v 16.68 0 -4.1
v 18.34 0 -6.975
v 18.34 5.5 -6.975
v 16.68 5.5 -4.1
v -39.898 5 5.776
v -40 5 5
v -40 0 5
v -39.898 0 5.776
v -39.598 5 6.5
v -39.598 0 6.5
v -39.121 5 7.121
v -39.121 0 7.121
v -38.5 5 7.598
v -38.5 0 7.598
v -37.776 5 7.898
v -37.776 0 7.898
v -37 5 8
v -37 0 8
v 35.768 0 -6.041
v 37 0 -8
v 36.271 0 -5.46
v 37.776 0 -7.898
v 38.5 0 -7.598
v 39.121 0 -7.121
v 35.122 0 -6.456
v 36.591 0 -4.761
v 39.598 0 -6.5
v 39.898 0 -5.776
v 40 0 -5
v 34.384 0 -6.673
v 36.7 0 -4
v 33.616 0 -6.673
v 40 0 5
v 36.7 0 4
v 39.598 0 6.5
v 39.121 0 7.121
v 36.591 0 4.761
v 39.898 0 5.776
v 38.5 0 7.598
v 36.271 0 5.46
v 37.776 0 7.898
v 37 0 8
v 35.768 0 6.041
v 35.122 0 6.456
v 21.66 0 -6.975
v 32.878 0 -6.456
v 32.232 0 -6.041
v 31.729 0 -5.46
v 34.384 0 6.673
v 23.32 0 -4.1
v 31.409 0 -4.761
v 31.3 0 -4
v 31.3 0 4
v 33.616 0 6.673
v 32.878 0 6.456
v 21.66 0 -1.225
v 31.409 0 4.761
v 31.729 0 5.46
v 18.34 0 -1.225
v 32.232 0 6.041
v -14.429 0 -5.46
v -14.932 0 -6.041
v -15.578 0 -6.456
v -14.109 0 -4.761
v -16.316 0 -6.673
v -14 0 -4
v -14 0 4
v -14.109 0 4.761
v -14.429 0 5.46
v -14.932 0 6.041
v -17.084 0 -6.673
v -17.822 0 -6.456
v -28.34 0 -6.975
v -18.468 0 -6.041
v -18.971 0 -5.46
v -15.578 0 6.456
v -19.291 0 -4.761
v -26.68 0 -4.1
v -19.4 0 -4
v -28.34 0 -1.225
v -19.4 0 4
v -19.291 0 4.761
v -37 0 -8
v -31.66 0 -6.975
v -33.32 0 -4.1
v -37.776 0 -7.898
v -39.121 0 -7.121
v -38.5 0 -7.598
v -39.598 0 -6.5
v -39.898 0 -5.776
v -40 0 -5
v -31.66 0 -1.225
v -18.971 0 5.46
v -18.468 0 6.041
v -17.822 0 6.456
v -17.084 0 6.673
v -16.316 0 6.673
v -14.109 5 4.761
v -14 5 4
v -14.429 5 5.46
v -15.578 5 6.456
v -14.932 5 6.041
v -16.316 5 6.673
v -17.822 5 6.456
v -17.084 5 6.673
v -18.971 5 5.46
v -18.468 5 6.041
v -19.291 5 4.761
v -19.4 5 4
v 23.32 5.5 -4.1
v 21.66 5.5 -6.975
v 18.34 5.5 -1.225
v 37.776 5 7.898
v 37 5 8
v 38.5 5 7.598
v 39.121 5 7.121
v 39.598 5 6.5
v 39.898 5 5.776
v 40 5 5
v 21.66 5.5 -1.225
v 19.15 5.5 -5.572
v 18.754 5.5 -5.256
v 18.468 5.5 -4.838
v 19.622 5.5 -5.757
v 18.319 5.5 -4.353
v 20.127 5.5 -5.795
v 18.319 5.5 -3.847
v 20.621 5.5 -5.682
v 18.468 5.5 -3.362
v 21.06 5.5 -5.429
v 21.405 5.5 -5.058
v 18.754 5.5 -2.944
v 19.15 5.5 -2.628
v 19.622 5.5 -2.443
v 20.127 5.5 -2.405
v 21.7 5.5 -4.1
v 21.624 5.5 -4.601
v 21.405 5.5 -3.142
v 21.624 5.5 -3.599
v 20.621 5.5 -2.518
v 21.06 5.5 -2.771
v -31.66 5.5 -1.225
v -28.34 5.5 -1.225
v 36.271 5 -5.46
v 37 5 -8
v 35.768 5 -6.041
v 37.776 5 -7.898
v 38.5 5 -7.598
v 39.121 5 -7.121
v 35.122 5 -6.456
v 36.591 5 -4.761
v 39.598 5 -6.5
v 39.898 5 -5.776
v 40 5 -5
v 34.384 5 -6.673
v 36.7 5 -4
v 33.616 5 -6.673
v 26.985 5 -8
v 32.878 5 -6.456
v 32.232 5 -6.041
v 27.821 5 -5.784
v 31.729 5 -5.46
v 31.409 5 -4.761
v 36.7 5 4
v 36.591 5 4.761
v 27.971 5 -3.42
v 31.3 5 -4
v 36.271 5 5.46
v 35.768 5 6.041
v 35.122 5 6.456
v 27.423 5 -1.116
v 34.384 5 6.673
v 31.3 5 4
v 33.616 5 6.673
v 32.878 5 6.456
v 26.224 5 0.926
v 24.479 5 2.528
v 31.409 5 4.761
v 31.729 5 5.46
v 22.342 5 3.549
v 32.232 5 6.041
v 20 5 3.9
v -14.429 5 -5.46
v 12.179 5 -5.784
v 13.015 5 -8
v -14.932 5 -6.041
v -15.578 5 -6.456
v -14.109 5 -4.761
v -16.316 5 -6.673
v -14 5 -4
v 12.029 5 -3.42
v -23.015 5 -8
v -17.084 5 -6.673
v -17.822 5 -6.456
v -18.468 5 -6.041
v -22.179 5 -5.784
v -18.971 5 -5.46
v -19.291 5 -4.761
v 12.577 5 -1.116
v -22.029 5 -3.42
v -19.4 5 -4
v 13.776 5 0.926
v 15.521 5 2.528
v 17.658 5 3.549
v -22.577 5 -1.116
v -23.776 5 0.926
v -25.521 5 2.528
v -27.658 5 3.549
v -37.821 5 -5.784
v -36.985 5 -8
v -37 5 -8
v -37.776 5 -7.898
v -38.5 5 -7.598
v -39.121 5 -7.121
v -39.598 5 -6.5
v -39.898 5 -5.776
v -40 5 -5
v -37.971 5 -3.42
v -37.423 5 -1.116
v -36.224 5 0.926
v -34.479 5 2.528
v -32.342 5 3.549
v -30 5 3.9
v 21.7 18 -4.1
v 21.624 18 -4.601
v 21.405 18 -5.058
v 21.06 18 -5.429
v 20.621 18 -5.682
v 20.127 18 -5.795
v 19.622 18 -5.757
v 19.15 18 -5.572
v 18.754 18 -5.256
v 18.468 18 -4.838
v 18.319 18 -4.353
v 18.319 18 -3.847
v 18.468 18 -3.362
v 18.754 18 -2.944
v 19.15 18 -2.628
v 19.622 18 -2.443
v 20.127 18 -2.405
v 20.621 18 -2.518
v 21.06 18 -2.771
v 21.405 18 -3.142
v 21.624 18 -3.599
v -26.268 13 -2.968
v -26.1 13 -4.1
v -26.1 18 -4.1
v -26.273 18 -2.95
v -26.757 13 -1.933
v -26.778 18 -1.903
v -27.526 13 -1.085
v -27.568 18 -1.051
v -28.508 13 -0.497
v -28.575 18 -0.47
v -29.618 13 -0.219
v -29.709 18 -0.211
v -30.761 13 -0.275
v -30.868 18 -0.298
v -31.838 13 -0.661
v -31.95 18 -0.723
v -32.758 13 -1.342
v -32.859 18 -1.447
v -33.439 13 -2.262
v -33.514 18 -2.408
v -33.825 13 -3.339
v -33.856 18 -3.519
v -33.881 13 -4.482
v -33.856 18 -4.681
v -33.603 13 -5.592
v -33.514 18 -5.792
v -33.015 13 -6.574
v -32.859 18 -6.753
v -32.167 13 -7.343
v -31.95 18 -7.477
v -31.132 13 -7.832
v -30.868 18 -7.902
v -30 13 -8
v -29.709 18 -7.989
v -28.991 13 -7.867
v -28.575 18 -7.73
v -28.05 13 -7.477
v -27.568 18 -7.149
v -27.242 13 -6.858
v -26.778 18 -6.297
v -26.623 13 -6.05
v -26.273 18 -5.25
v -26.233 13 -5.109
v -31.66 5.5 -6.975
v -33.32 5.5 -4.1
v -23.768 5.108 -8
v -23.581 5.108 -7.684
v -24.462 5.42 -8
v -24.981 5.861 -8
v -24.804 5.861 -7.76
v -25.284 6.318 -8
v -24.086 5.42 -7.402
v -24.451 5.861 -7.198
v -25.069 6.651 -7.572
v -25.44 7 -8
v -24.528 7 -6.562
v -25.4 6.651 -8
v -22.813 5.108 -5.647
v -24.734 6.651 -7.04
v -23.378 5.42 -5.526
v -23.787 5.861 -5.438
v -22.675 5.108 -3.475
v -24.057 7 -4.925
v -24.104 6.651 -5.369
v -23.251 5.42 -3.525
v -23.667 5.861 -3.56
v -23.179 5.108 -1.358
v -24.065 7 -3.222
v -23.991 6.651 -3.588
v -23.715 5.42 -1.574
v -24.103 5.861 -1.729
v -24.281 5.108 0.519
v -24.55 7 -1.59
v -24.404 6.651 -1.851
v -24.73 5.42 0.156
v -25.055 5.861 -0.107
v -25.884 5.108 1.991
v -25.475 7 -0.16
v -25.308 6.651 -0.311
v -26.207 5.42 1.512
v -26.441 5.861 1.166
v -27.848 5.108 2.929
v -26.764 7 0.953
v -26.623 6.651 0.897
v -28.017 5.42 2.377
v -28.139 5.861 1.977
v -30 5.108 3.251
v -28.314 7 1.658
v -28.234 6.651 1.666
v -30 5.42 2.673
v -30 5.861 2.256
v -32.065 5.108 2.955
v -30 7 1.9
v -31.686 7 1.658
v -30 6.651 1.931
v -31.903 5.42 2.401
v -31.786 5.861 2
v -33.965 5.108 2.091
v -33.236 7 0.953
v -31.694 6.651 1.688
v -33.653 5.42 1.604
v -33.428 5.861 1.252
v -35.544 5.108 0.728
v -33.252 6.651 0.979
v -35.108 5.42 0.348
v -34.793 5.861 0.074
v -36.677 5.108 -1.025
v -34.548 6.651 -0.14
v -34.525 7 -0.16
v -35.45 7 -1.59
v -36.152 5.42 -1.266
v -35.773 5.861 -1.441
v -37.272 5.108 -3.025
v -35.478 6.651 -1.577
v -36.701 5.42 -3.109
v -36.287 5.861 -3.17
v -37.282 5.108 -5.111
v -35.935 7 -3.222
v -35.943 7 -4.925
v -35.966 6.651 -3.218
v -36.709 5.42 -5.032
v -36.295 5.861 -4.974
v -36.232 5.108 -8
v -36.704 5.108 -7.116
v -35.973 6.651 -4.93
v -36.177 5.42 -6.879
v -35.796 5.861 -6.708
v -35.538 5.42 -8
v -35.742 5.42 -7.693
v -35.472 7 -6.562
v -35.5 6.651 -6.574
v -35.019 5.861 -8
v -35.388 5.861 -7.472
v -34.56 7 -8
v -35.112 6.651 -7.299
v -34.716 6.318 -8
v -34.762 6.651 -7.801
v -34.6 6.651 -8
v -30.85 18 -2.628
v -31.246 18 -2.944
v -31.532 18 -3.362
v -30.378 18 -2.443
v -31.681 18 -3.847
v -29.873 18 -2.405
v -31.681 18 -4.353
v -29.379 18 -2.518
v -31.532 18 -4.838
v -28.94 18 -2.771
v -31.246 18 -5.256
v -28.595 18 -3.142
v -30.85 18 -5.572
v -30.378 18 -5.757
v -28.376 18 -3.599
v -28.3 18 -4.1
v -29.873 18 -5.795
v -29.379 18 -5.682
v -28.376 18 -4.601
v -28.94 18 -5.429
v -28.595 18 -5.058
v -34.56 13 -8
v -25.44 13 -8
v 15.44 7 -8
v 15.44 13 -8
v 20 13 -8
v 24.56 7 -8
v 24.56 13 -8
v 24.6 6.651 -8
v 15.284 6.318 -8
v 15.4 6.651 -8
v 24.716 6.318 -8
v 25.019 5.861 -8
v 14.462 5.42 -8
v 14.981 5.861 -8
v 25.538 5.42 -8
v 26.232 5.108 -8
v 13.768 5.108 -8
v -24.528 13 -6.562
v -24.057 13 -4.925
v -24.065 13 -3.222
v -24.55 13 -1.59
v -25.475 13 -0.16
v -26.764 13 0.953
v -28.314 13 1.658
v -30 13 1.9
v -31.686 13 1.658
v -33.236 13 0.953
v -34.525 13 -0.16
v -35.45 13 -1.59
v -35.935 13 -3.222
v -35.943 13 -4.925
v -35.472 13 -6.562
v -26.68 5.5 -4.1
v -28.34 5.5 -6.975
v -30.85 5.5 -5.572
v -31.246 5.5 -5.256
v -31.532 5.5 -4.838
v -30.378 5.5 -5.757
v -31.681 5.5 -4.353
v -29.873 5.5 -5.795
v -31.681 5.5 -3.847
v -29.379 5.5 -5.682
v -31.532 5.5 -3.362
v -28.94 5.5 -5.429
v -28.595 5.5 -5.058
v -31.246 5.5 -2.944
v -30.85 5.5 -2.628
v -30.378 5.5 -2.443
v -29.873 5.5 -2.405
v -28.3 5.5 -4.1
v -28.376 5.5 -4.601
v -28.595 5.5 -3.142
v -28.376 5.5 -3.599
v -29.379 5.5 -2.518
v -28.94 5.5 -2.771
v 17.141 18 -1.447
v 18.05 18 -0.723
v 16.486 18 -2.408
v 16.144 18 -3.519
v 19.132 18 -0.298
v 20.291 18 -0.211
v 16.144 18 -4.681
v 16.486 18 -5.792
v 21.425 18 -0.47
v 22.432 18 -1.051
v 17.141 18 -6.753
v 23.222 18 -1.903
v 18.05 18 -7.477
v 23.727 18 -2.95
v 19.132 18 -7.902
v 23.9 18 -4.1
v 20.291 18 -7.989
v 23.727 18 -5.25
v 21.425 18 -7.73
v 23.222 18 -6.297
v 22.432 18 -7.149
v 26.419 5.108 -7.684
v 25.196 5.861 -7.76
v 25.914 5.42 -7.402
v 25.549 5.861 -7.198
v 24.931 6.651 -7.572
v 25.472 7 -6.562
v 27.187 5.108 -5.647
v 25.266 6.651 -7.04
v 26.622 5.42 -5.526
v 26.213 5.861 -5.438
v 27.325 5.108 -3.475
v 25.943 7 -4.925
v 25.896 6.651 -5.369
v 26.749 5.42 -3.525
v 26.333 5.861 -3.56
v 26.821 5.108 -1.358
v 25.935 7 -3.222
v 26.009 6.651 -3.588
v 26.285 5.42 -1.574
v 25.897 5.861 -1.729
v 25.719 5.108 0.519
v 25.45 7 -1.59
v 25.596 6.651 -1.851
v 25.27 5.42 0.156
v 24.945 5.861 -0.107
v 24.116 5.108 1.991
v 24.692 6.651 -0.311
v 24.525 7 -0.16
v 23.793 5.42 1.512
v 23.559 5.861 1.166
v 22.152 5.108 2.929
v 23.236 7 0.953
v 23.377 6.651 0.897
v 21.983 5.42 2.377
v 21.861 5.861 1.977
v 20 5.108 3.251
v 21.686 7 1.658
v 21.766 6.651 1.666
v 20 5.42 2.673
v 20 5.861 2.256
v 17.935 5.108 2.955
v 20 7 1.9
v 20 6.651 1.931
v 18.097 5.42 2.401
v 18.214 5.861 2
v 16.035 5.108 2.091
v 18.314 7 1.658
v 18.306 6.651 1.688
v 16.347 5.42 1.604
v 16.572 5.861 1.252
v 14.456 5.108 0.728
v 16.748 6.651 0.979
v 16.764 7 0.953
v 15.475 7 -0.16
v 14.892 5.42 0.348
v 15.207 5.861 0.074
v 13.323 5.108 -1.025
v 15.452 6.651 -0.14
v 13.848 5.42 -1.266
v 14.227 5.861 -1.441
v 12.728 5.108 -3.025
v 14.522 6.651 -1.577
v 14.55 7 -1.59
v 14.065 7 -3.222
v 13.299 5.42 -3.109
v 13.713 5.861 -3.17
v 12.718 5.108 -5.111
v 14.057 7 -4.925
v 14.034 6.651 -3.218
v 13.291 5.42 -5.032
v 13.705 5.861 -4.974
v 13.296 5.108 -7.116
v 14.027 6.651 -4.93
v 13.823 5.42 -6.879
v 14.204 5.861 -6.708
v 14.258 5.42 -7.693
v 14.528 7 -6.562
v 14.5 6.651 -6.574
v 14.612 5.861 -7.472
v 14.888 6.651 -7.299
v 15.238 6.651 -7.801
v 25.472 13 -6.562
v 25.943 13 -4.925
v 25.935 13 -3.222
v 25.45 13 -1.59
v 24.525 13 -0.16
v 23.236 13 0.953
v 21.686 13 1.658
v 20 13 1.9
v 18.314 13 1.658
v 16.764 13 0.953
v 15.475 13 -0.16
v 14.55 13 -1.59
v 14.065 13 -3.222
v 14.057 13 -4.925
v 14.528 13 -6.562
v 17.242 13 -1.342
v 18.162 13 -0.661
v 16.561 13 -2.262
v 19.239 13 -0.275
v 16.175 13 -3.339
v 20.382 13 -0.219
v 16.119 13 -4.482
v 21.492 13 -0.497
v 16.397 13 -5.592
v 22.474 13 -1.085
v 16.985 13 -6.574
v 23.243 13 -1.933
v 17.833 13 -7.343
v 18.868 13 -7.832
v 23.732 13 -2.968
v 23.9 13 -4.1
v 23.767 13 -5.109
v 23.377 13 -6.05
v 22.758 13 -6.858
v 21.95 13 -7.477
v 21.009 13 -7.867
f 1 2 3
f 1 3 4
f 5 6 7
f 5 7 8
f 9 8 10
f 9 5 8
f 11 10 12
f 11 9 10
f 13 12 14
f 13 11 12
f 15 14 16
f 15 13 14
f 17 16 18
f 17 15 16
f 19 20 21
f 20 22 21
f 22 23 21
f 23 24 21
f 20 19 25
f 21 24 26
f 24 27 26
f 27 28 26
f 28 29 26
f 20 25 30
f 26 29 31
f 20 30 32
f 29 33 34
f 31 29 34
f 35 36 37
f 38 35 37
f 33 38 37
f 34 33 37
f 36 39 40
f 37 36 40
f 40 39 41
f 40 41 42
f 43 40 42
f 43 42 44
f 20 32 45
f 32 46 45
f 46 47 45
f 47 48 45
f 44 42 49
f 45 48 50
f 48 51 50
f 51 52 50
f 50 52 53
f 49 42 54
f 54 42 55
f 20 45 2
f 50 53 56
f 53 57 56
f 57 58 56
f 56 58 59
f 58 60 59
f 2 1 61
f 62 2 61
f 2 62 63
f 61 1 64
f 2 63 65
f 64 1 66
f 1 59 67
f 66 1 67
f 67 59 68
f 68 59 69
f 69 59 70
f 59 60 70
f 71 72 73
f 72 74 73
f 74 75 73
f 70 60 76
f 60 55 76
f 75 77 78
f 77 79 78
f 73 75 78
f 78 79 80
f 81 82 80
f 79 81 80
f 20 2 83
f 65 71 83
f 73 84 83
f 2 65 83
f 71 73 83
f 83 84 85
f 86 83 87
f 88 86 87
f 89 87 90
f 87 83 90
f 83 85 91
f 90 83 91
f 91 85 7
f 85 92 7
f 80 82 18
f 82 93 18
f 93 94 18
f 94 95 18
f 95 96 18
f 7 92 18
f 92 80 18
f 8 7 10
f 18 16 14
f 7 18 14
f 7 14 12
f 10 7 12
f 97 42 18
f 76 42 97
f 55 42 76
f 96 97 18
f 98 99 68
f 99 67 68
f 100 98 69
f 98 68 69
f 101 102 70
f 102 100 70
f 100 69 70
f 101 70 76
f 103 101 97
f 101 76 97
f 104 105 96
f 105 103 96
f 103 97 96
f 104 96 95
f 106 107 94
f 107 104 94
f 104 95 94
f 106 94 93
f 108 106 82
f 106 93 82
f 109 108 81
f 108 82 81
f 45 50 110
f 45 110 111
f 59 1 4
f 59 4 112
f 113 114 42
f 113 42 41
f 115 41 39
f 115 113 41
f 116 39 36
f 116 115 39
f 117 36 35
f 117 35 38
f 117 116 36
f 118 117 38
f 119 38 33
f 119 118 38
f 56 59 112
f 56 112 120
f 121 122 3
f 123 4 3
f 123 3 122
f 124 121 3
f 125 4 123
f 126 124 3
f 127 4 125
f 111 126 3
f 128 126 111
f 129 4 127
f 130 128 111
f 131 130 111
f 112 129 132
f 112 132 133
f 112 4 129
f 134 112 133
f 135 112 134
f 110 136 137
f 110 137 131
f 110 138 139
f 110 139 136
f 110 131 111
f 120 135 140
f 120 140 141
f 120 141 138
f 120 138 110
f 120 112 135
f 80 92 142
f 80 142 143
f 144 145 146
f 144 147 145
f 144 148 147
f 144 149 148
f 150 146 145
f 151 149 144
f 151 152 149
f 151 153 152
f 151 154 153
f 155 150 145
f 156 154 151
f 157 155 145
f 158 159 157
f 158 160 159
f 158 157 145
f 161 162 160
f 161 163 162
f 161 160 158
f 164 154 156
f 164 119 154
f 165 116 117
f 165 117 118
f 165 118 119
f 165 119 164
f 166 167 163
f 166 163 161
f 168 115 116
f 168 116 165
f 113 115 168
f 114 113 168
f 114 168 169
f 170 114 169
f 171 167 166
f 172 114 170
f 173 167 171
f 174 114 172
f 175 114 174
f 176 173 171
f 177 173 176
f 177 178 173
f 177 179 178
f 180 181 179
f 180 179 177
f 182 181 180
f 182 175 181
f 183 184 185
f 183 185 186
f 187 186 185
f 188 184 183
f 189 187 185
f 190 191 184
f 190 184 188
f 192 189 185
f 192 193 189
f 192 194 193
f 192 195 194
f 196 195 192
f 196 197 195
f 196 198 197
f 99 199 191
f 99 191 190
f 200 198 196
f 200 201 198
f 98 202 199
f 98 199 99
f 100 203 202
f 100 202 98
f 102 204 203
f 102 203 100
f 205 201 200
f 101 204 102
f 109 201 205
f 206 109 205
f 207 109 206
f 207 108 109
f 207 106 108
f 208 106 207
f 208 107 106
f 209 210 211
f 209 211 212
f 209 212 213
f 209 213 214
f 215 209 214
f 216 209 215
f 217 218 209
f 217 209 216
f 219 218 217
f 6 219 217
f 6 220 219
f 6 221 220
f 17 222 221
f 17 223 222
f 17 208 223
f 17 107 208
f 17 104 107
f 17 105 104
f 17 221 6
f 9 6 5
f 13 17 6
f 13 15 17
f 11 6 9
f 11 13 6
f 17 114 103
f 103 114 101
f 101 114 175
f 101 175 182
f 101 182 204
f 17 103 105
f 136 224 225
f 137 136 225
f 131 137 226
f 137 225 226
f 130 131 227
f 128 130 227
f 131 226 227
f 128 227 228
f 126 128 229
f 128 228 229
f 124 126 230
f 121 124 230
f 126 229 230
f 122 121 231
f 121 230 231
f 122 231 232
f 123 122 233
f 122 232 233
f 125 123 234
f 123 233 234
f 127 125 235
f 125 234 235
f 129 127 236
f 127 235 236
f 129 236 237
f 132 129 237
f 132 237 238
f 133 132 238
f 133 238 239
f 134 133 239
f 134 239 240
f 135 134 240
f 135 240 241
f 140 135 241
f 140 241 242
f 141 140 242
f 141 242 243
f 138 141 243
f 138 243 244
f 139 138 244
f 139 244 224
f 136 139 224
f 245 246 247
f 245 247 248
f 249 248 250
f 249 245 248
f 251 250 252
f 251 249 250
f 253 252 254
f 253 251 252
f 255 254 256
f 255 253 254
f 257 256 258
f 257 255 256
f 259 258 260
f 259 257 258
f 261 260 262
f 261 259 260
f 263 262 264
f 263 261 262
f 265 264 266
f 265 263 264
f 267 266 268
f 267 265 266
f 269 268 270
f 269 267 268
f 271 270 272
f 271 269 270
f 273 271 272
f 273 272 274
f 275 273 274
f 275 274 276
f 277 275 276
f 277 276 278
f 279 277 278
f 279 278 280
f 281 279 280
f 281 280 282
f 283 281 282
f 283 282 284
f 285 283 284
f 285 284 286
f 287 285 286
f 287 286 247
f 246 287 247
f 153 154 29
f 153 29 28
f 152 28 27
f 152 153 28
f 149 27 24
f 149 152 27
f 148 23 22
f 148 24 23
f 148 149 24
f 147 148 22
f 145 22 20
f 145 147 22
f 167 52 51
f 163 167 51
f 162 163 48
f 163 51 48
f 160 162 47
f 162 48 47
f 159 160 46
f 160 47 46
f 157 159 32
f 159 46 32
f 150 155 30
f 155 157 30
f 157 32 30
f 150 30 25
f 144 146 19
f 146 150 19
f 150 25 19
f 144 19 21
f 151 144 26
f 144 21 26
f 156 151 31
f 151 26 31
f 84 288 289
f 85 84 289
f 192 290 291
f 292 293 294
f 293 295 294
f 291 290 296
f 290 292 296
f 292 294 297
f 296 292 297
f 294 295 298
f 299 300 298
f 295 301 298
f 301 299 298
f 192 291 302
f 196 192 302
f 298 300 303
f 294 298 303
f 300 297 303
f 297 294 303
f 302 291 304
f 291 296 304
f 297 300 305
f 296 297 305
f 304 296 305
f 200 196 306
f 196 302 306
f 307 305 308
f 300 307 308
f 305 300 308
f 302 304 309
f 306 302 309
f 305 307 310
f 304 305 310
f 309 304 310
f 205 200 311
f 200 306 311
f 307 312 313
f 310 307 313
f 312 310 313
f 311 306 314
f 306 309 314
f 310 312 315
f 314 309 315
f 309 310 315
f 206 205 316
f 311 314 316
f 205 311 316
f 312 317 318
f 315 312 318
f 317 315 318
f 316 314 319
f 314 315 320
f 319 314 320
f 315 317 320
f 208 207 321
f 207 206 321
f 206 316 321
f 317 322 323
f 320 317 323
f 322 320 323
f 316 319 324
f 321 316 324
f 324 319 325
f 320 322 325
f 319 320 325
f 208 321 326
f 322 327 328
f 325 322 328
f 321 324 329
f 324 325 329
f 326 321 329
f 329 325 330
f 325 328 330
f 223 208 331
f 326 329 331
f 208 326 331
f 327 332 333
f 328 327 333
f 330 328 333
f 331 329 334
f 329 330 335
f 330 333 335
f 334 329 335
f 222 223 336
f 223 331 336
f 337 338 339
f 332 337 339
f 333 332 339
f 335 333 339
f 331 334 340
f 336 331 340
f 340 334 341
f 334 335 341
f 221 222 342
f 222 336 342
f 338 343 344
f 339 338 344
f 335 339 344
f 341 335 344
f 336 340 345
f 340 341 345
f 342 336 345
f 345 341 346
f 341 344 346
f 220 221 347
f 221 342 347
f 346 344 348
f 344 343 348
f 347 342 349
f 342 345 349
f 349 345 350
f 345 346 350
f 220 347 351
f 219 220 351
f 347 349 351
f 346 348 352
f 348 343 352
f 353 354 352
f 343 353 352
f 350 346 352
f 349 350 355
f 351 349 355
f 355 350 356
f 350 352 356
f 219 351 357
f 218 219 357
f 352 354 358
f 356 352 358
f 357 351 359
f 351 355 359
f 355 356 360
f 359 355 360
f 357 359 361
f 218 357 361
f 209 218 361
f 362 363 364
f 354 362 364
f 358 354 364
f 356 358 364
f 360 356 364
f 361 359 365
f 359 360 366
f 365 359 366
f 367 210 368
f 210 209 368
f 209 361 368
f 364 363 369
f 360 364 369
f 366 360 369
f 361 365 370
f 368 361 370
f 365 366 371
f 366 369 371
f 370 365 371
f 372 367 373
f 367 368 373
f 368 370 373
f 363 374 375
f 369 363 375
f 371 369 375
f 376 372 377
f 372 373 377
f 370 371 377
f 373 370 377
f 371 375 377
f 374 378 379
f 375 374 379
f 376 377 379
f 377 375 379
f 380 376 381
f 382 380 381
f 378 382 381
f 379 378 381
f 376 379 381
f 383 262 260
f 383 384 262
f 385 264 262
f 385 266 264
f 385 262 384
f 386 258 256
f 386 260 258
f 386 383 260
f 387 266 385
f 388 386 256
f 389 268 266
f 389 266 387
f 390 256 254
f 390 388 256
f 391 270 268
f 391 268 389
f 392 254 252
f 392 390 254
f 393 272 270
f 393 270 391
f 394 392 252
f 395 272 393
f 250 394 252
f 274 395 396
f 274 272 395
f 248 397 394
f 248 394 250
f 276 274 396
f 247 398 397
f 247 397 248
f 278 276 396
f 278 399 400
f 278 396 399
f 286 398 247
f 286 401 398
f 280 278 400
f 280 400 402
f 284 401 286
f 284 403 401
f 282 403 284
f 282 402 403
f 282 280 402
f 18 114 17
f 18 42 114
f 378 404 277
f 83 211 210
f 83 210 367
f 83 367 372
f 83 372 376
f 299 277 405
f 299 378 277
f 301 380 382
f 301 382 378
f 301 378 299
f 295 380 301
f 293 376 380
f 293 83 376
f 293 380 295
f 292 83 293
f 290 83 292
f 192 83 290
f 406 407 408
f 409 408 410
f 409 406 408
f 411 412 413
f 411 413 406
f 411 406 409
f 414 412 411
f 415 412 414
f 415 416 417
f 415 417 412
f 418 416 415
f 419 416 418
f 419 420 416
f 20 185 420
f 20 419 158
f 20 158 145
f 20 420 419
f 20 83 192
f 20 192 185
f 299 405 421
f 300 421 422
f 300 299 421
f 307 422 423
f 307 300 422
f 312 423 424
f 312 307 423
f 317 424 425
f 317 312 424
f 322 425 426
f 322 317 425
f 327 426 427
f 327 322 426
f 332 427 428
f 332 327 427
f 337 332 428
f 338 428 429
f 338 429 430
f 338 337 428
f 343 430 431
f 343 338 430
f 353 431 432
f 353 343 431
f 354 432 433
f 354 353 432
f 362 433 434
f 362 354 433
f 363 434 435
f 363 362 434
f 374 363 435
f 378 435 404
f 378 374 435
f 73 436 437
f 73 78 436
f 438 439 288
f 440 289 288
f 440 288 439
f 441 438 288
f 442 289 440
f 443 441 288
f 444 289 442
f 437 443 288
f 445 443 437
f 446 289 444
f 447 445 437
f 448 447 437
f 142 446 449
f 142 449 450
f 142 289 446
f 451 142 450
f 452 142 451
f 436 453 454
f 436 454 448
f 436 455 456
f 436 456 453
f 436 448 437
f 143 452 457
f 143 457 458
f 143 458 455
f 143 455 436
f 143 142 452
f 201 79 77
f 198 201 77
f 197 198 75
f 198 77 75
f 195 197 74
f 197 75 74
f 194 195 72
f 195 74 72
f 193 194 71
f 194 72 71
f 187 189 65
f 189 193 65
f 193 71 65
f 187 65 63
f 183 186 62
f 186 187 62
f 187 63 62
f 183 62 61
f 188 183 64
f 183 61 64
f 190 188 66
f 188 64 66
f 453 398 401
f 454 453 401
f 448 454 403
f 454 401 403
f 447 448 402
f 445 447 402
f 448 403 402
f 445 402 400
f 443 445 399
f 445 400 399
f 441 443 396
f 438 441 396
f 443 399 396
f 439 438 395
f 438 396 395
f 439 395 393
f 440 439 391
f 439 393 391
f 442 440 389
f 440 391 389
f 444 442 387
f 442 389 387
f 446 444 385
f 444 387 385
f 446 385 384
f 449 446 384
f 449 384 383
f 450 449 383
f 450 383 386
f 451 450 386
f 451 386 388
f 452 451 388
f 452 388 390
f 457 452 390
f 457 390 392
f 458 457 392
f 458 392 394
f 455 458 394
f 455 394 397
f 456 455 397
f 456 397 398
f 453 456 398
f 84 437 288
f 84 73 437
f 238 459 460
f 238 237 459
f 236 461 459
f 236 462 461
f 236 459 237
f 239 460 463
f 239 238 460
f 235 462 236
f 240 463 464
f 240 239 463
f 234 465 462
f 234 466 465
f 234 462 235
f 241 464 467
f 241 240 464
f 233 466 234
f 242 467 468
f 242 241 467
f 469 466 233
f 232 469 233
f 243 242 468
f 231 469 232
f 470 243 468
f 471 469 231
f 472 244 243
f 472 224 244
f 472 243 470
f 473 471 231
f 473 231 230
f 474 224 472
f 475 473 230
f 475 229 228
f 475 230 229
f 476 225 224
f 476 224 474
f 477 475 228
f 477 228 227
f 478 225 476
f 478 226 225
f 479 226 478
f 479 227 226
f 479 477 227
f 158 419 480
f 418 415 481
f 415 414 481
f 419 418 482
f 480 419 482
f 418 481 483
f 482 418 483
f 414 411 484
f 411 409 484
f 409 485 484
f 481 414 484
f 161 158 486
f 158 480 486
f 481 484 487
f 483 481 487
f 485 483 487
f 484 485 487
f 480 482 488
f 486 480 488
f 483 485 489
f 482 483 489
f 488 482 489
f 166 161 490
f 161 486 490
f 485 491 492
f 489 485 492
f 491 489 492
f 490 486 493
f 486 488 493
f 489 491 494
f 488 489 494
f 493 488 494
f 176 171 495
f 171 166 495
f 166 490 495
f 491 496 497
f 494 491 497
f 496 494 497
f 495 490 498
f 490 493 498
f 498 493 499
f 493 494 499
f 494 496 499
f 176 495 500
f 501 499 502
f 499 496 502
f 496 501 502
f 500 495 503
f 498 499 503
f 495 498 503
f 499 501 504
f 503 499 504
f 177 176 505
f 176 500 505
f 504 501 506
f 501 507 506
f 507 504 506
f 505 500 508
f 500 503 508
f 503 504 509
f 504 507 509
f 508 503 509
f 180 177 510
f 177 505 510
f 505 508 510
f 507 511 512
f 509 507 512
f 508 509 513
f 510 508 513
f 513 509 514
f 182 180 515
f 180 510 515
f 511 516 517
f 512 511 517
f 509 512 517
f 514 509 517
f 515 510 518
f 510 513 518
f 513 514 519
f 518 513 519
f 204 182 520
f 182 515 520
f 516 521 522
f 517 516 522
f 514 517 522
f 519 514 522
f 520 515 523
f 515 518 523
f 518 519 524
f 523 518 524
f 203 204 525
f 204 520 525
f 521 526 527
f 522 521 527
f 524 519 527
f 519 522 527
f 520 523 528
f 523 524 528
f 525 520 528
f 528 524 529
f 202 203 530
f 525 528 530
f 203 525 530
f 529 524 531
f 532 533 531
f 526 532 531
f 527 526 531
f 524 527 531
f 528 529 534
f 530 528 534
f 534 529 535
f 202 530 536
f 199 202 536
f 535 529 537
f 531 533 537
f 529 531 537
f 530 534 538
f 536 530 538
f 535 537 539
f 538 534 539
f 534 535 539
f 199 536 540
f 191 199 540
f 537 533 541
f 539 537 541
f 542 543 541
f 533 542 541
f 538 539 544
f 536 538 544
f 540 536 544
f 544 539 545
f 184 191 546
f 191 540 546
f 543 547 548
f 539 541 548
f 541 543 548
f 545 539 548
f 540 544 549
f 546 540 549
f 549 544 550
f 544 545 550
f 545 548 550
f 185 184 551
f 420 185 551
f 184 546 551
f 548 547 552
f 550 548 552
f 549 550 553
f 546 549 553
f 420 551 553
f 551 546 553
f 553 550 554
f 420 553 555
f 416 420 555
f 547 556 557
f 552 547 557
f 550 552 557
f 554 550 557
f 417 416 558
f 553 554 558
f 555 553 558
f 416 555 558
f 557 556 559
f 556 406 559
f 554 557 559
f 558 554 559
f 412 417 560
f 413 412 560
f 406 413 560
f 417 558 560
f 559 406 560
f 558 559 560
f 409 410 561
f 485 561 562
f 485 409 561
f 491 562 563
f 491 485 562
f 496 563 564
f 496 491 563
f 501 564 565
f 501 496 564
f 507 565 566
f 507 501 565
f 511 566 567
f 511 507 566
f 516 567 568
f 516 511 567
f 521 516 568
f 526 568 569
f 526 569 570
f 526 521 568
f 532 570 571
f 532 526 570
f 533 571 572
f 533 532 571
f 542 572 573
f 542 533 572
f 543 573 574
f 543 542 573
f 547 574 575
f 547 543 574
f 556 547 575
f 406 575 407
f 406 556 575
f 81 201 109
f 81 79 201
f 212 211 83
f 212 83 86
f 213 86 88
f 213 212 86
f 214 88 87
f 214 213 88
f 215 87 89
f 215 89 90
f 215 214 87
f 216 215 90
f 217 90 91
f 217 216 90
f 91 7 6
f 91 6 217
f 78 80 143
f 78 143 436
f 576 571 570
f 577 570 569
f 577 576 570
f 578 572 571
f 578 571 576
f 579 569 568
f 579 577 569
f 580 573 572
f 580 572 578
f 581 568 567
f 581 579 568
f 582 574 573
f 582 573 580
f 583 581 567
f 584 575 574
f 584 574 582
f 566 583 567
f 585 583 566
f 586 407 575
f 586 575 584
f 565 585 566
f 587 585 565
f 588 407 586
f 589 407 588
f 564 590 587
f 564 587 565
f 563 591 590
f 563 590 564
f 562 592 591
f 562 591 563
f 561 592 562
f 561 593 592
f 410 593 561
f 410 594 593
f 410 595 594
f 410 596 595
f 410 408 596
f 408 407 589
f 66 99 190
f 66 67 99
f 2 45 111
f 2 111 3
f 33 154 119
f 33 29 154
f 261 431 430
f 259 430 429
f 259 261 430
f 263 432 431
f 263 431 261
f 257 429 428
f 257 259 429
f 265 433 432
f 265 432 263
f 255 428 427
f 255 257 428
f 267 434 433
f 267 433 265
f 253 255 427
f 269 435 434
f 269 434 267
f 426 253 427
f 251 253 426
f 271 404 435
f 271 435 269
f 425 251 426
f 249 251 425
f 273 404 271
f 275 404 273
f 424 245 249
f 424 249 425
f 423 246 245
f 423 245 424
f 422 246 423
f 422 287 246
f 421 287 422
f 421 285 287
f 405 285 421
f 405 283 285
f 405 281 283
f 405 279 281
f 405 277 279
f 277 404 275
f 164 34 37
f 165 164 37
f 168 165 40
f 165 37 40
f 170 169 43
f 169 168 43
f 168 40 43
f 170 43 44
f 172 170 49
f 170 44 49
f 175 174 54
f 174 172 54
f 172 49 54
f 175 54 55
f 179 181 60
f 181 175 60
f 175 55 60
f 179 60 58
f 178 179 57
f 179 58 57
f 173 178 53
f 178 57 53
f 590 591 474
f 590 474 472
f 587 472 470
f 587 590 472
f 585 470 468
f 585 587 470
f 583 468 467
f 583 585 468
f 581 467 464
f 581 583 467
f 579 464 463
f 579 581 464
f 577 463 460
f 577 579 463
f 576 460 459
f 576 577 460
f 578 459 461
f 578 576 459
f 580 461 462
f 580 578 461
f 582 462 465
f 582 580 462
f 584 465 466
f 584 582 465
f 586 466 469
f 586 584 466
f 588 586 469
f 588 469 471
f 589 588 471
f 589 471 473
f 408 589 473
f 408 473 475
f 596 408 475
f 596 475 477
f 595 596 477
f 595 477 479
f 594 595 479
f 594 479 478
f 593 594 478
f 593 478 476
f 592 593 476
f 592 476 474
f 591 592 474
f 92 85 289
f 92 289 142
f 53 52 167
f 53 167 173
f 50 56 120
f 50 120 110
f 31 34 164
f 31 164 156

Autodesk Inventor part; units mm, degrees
ref_plane "YZ Plane" through (0, 0, 0) normal (1, 0, 0) x (0, 1, 0)
ref_plane "XZ Plane" through (0, 0, 0) normal (0, 1, 0) x (-1, 0, 0)
ref_plane "XY Plane" through (0, 0, 0) normal (0, 0, 1) x (1, 0, 0)
sketch "Boceto1" plane through (0, 0, 0) normal (0, 1, 0) x (-1, 0, 0)
  line L0 (-40, 8) -> (40, 8)
  line L1 (40, 8) -> (40, -8)
  line L2 (40, -8) -> (-40, -8)
  line L3 (-40, -8) -> (-40, 8)
  line L4 (-40, 8) -> (40, -8) construction
  line L5 (40, 8) -> (-40, -8) construction
  circle A0 centre (-34, 4) radius 2.7
  circle A1 centre (-34, -4) radius 2.7
  circle A2 centre (16.7, 4) radius 2.7
  circle A3 centre (16.7, -4) radius 2.7
  line L6 (19.4, 4) -> (14, 4)
  line L7 (14, 4) -> (14, -4)
  line L8 (14, -4) -> (19.4, -4)
  line L9 (19.4, -4) -> (19.4, 4)
  line L10 (-31.3, 4) -> (-36.7, 4)
  line L11 (-36.7, 4) -> (-36.7, -4)
  line L12 (-36.7, -4) -> (-31.3, -4)
  line L13 (-31.3, -4) -> (-31.3, 4)
  point P0 (0, 0)
  point P1 (16.7, -4)
  point P2 (16.7, 4)
  point P3 (-34, -4)
  point P4 (-34, 4)
  point P5 (19.4, -4)
  point P6 (-31.3, -4)
  dimension "d2" = 5.4
  dimension "d0" = 80
  dimension "d1" = 16
  dimension "d3" = 4
  dimension "d4" = 8
  dimension "d5" = 6
  dimension "d6" = 50.7
extrude "Extrusión1" add sketch "Boceto1" along normal blind 5
sketch "Boceto2" plane through (0, 5, 0) normal (0, 1, 0) x (1, 0, 0)
  circle A0 centre (20, 4.1) radius 3.9
  circle A1 centre (-30, 4.1) radius 3.9
  line L0 (40, 8) -> (-40, 8) projected
  line L1 (40, -8) -> (40, 8) projected
  line L2 (-40, 8) -> (-40, -8) projected
  point P0 (0, 0)
  dimension "d11" = 7.8
  dimension "d12" = 20
  dimension "d13" = 10
extrude "Extrusión2" add sketch "Boceto2" along normal blind 13
sketch "Boceto3" plane through (0, 5, 0) normal (0, 1, 0) x (1, 0, 0)
  line L0 (31.3, -4) -> (31.3, 4) projected
  arc A0 (36.7, 4) -> (31.3, 4) centre (34, 4) ccw projected
  line L1 (36.7, 4) -> (36.7, -4) projected
  arc A1 (31.3, -4) -> (36.7, -4) centre (34, -4) ccw projected
  line L2 (-19.4, -4) -> (-19.4, 4) projected
  arc A2 (-14, 4) -> (-19.4, 4) centre (-16.7, 4) ccw projected
  line L3 (-14, 4) -> (-14, -4) projected
  arc A3 (-19.4, -4) -> (-14, -4) centre (-16.7, -4) ccw projected
  line L4 (40, 8) -> (20, 8) projected
  circle A4 centre (20, 4.1) radius 3.9 projected
  line L5 (20, 8) -> (-30, 8) projected
  circle A5 centre (-30, 4.1) radius 3.9 projected
  line L6 (-30, 8) -> (-40, 8) projected
  line L7 (-40, 8) -> (-40, -8) projected
  line L8 (-40, -8) -> (40, -8) projected
  line L9 (40, -8) -> (40, 8) projected
  circle A6 centre (-30, 4.1) radius 3.9 projected
  circle A7 centre (-30, 4.1) radius 6
  circle A8 centre (20, 4.1) radius 3.9 projected
  circle A9 centre (20, 4.1) radius 6
  point P0 (0, 0)
  point P1 (15.4404, 8)
  point P2 (24.5596, 8)
  point P3 (-34.5596, 8)
  point P4 (-25.4404, 8)
  dimension "d14" = 12
  dimension "d15" = 12
extrude "Extrusión3" add sketch "Boceto3" along normal blind 8 contours A9 L5 L4 | A7 L6 L5 picked at (25.2424, 3.6235) picked at (-24.7576, 3.6235)
fillet "Empalme1" radius 2 2 edges at (20, 5, 1.9) (-30, 5, 1.9)
sketch "Boceto4" plane through (-30, 18, -4.1) normal (0, 1, 0) x (1, 0, 0)
  circle A0 centre (0, 0) radius 3.9 projected
  circle A1 centre (0, 0) radius 1.7
  circle A2 centre (50, 0) radius 3.9 projected
  circle A3 centre (50, 0) radius 1.7
  point P0 (30, -4.1)
  dimension "d19" = 3.4
  dimension "d20" = 3.4
extrude "Extrusión4" cut sketch "Boceto4" against normal through all contours A1 | A3
fillet "Empalme2" radius 3 4 edges at (-40, 2.5, 8) (-40, 2.5, -8) (40, 2.5, 8) (40, 2.5, -8)
sketch "Boceto5" plane through (0, 0, 0) normal (0, -1, 0) x (1, 0, 0)
  circle A0 centre (-30, -4.1) radius 1.7 projected
  circle A1 centre (-30, -4.1) radius 2.875
  circle A2 centre (20, -4.1) radius 1.7 projected
  circle A3 centre (20, -4.1) radius 2.875
  line L0 (-33.3198, -4.1) -> (-31.6599, -1.225)
  line L1 (-31.6599, -1.225) -> (-28.3401, -1.225)
  line L2 (-28.3401, -1.225) -> (-26.6802, -4.1)
  line L3 (-26.6802, -4.1) -> (-28.3401, -6.975)
  line L4 (-28.3401, -6.975) -> (-31.6599, -6.975)
  line L5 (-31.6599, -6.975) -> (-33.3198, -4.1)
  line L6 (16.6802, -4.1) -> (18.3401, -1.225)
  line L7 (18.3401, -1.225) -> (21.6599, -1.225)
  line L8 (21.6599, -1.225) -> (23.3198, -4.1)
  line L9 (23.3198, -4.1) -> (21.6599, -6.975)
  line L10 (21.6599, -6.975) -> (18.3401, -6.975)
  line L11 (18.3401, -6.975) -> (16.6802, -4.1)
  point P0 (0, 0)
  dimension "d24" = 5.75
extrude "Extrusión5" cut sketch "Boceto5" against normal blind 5.5 contours A0 | A1 | A1 L2 L3 | A1 L1 L2 | L3 L4 A1 | A1 L0 L1 | L4 L5 A1 | A1 L5 L0 | A2 | A3 | A3 L8 L9 | A3 L7 L8 | L9 L10 A3 | A3 L6 L7 | L10 L11 A3 | A3 L11 L6
properties part number "Rack support"
